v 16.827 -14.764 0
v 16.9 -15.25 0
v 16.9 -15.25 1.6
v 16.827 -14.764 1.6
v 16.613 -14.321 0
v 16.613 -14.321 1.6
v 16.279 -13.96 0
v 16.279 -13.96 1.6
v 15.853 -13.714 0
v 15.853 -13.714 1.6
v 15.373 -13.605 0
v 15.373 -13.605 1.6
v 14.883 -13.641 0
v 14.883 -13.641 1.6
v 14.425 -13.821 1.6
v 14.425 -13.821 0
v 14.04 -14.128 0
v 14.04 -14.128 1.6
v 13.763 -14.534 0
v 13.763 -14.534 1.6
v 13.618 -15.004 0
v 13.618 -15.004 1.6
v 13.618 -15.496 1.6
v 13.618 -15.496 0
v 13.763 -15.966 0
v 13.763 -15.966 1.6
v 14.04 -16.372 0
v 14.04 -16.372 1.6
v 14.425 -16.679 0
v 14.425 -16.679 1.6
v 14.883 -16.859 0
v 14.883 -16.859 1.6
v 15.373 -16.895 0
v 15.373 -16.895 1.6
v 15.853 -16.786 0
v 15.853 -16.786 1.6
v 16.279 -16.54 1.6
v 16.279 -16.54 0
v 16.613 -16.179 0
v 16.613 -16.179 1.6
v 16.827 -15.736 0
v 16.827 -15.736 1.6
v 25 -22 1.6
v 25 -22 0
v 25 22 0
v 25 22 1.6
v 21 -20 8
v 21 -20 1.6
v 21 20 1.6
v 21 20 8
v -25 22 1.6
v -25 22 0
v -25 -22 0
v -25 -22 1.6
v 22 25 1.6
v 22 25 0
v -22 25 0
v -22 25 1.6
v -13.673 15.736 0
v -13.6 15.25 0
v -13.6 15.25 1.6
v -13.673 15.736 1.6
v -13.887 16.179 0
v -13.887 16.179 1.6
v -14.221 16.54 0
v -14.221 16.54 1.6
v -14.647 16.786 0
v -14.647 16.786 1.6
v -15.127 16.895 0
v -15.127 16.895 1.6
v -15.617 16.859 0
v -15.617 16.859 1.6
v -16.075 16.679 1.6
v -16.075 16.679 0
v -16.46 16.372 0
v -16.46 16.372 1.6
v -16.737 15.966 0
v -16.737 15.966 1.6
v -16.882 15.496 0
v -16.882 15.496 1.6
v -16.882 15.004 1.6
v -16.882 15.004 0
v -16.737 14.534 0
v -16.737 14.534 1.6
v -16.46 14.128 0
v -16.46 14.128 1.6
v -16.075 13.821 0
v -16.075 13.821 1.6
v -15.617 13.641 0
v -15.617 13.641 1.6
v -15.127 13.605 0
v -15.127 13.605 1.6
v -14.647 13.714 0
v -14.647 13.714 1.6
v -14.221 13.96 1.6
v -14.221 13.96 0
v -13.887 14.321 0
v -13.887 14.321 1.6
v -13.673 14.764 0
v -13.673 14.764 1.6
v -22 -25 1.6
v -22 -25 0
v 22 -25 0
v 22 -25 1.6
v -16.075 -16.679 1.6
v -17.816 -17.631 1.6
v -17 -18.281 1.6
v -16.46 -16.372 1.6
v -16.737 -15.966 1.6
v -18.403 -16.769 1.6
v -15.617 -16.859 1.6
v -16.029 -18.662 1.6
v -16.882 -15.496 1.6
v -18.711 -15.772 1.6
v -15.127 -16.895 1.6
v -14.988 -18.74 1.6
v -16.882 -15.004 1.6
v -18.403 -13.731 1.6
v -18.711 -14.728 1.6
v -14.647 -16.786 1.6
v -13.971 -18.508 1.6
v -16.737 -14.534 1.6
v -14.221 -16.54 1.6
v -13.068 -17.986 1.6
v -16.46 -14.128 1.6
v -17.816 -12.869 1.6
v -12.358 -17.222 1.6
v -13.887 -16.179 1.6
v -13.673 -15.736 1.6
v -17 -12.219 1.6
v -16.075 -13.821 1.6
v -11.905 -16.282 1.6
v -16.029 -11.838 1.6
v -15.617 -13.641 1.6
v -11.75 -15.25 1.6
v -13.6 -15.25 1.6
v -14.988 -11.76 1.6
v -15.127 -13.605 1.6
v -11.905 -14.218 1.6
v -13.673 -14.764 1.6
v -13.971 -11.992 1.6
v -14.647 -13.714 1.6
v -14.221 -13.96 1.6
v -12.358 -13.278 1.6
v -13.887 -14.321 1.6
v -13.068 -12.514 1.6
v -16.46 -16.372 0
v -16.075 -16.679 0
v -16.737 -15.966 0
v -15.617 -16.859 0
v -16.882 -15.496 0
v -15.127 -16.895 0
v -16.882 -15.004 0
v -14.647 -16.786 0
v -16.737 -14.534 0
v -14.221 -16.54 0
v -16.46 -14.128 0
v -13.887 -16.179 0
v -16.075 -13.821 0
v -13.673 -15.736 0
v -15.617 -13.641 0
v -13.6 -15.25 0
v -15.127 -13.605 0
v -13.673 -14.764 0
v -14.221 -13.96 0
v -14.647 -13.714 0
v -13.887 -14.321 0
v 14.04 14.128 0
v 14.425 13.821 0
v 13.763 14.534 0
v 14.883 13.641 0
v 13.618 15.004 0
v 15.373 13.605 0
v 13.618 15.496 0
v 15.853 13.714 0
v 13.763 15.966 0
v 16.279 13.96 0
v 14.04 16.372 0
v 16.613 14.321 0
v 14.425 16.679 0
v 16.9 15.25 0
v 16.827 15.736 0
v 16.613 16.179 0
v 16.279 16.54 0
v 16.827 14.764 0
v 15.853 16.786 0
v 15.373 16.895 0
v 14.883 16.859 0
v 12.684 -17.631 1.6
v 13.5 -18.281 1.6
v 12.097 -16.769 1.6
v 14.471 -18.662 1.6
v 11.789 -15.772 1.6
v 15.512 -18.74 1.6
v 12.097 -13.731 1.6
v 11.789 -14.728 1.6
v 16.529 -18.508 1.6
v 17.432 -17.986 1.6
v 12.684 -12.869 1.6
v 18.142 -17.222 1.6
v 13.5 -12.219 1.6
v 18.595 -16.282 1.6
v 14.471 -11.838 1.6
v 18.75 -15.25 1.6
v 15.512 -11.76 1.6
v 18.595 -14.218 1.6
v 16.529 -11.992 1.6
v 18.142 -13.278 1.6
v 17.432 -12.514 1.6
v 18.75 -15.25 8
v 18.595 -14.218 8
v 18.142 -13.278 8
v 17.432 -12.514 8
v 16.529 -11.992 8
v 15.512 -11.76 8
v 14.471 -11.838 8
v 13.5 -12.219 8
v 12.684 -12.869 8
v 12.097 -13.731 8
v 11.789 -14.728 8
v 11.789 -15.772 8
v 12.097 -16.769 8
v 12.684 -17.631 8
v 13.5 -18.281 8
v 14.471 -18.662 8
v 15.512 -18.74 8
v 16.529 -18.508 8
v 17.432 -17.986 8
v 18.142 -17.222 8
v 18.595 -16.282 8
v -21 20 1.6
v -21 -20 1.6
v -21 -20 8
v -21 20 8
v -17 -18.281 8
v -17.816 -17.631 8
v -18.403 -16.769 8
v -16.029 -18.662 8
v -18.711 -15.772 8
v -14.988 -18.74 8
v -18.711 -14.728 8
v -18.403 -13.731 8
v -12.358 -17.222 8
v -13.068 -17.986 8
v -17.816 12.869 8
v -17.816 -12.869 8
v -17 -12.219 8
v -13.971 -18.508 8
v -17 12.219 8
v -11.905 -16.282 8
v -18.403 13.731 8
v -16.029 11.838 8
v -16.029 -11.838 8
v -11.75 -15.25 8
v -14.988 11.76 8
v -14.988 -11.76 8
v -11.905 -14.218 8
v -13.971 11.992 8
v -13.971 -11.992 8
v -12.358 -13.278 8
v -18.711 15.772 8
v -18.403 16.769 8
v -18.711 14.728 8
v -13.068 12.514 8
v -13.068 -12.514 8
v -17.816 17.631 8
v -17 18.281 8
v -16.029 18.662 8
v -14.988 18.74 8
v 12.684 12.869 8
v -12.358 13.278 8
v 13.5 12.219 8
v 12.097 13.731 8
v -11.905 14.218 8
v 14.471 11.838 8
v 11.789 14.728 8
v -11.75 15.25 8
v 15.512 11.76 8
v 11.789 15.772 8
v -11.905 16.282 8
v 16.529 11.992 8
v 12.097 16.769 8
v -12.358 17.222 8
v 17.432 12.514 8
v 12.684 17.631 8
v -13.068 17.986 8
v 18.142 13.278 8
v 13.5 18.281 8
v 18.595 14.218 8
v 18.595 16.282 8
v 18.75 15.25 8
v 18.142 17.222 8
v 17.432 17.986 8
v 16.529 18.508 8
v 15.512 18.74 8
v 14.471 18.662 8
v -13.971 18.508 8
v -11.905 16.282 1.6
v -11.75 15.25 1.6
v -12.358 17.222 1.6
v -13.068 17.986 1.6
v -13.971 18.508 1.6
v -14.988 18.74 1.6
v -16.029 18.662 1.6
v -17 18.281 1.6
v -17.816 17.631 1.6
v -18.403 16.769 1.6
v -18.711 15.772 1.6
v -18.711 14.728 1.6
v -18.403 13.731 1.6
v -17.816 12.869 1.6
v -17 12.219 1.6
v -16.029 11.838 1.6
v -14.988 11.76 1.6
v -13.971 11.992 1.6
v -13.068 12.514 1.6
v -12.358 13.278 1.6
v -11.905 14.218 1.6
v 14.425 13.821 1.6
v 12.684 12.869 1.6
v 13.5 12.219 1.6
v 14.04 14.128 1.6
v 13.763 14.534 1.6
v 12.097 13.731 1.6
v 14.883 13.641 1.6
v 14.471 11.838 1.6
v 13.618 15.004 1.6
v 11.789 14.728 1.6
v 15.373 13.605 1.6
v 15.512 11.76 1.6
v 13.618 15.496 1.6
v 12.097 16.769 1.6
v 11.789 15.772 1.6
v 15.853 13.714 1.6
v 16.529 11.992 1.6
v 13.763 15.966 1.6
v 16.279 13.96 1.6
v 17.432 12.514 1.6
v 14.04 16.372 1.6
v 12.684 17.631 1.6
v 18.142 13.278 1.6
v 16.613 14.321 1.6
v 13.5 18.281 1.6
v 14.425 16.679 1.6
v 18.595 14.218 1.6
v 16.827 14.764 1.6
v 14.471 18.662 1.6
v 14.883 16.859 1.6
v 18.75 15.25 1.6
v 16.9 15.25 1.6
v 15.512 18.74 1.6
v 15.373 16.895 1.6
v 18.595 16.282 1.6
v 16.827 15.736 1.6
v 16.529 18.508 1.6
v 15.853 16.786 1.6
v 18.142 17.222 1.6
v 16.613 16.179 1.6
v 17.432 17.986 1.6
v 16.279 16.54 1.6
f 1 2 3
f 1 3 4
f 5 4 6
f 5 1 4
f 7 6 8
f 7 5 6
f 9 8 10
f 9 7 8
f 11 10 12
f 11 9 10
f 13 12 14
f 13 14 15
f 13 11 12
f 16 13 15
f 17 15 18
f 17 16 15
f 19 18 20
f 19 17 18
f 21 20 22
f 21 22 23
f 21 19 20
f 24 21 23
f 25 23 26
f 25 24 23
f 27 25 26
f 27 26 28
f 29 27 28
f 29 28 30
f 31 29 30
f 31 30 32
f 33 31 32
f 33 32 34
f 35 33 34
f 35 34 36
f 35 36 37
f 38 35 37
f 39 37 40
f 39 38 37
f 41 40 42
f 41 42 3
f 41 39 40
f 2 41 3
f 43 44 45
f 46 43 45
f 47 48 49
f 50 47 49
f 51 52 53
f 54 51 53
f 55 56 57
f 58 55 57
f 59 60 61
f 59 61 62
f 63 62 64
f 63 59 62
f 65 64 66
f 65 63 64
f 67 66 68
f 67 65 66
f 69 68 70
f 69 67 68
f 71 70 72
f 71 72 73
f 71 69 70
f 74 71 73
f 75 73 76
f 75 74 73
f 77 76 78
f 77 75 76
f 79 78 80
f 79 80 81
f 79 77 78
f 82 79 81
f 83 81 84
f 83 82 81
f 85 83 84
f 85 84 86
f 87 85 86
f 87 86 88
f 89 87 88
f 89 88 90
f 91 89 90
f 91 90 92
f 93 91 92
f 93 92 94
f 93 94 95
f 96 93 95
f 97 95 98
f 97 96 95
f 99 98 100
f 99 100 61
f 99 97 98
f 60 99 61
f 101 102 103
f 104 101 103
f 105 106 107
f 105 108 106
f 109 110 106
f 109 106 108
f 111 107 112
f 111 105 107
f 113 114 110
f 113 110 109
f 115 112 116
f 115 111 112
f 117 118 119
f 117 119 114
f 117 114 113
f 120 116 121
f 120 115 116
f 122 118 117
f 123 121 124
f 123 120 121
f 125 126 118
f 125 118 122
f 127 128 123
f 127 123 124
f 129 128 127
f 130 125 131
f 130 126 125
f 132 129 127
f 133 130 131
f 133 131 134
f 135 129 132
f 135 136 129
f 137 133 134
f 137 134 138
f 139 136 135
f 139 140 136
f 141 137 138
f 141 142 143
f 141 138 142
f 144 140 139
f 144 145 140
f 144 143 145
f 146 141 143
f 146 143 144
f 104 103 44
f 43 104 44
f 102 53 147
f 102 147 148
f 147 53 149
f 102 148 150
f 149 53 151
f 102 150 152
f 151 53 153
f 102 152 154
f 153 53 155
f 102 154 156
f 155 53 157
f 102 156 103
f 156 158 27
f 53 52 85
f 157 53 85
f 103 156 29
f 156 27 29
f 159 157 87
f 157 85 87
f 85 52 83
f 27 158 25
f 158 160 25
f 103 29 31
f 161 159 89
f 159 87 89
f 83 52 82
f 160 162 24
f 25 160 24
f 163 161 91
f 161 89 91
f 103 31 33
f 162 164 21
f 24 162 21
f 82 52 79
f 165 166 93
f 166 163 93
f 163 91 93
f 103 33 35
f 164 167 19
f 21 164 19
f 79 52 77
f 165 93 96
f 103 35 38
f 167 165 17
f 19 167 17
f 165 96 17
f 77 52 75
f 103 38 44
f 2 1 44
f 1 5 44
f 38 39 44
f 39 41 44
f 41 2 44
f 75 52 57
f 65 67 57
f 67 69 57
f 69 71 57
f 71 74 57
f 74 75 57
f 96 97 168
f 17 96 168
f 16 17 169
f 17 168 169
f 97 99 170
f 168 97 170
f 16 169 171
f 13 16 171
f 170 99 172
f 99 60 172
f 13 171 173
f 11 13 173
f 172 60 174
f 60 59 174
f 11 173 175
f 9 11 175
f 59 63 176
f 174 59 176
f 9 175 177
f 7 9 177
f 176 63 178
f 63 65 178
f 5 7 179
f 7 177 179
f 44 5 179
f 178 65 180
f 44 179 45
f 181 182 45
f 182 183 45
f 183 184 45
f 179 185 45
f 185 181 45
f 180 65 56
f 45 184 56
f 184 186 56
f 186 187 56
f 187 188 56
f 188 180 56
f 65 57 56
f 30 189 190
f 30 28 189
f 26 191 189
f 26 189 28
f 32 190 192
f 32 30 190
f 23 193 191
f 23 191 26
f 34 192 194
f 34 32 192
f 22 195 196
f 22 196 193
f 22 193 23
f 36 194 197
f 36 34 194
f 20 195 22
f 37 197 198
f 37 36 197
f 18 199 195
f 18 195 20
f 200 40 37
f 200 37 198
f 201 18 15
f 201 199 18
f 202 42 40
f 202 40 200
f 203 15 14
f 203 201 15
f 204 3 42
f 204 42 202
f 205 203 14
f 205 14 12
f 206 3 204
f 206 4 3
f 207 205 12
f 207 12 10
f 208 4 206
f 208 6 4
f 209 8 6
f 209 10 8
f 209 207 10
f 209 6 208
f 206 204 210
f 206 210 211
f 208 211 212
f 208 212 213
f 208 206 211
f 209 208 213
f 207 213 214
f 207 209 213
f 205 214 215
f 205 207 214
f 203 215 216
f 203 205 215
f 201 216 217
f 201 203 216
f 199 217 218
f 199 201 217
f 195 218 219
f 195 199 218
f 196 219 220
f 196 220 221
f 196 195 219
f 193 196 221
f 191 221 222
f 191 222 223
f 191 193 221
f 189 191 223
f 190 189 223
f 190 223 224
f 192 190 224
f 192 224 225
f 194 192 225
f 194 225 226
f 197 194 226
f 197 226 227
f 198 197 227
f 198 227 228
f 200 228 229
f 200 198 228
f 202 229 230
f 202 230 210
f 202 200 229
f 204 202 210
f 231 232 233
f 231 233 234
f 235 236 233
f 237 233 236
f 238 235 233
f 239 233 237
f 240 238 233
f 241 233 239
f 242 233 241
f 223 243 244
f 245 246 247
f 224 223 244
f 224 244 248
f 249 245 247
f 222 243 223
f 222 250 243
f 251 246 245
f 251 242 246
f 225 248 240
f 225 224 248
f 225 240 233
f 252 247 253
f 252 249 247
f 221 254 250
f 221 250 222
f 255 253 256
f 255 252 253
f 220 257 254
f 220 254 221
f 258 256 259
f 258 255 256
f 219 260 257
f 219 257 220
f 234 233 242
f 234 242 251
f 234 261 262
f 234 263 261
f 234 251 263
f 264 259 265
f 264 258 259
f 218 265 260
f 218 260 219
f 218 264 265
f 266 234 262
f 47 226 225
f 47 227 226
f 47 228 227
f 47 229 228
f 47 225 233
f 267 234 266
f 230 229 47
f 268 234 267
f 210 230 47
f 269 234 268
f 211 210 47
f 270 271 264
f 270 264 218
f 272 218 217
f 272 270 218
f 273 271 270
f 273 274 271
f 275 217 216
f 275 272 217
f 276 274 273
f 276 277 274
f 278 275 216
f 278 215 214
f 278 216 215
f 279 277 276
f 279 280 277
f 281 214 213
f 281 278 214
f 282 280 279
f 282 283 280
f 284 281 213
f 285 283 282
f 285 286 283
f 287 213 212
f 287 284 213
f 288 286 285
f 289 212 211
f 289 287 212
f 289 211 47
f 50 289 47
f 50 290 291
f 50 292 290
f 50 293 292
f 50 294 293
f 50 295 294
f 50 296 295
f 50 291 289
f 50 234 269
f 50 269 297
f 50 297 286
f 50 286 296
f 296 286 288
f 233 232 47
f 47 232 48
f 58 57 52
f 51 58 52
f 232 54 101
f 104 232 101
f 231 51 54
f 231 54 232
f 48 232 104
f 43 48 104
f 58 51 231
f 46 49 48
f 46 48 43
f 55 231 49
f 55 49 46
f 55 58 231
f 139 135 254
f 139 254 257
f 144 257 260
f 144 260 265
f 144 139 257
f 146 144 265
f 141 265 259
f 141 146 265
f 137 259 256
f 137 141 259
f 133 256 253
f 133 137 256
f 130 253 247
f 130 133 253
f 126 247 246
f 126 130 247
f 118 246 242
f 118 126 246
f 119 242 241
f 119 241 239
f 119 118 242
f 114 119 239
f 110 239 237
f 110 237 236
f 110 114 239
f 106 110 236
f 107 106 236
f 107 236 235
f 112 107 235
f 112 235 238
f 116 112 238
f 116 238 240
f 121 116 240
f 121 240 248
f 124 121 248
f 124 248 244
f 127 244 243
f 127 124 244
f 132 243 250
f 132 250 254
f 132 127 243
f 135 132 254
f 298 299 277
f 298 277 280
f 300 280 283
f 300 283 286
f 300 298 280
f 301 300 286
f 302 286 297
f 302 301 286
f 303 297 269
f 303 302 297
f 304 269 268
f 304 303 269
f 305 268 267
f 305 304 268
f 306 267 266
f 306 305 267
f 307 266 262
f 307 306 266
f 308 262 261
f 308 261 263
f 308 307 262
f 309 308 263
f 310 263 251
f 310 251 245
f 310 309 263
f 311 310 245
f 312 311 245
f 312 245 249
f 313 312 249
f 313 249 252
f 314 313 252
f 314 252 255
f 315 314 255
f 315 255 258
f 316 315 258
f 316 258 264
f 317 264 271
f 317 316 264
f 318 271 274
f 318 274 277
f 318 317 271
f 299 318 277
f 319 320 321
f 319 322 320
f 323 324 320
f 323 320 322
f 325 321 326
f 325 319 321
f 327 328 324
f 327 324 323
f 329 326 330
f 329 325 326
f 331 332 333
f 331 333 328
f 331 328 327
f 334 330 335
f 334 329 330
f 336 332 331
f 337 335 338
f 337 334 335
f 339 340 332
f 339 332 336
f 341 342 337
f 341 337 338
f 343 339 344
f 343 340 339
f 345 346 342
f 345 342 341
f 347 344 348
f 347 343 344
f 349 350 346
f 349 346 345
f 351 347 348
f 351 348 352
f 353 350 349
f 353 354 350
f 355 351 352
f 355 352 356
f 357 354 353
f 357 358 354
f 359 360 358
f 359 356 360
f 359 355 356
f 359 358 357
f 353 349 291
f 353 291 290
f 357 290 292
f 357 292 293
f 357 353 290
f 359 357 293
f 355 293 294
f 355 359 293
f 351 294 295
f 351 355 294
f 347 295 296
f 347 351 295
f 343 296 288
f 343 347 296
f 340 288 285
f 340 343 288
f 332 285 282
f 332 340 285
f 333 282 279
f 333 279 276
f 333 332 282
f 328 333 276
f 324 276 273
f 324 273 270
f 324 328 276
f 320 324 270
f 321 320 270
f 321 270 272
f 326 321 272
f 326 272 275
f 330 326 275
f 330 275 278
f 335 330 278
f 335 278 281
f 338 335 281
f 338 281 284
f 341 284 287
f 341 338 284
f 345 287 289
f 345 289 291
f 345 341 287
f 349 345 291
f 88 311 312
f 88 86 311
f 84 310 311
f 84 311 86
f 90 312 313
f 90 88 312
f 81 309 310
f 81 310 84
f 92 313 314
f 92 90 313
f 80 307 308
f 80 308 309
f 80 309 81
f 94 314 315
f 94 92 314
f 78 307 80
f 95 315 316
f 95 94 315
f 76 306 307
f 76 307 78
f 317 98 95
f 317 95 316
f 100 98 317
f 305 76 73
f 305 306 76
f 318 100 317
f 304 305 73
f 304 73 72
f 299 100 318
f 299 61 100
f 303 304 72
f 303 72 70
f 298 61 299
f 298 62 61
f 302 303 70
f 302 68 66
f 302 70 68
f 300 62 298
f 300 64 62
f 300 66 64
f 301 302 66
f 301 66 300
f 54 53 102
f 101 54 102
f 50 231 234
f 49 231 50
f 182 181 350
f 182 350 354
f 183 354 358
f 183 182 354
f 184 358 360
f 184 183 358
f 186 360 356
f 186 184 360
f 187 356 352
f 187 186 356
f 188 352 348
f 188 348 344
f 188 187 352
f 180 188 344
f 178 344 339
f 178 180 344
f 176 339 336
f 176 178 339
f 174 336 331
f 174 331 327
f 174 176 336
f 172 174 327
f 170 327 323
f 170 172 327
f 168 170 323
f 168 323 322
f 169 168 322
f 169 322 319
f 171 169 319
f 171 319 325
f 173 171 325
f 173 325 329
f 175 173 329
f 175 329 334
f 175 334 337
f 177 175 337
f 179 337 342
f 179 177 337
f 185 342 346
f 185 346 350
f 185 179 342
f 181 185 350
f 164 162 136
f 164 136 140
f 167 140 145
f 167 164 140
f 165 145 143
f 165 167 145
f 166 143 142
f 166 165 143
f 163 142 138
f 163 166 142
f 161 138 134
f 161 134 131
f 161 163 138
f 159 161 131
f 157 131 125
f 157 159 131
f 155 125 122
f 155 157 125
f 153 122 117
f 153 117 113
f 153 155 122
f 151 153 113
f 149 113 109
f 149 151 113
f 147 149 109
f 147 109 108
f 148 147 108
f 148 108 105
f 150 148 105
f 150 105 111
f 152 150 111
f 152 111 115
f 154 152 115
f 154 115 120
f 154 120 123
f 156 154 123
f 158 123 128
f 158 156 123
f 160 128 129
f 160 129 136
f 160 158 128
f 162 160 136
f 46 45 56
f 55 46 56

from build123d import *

# Parameters (mm, degrees)
SKETCH_1_R            = 1.65
EXTRUDE_241_DEPTH     = 1.6
EXTRUDE_START         = 1.6
SKETCH_2_W            = 42
SKETCH_2_H            = 40
EXTRUDE_307_DEPTH     = 6.4
CUT_EXTRUDE_START     = 1.6
SKETCH_3_R            = 3.5
CUT_EXTRUDE_391_DEPTH = 6.4


with BuildPart() as part:
    # 草图1 → Extrude 241 (new body)
    with BuildSketch(Plane.XY):
        Polygon((-22, -25), (22, -25), (25, -22), (25, 22), (22, 25), (-22, 25), (-25, 22), (-25, -22), align=None)
        with Locations((-15.25, -15.25)):
            Circle(SKETCH_1_R, mode=Mode.SUBTRACT)
        with Locations((-15.25, 15.25)):
            Circle(SKETCH_1_R, mode=Mode.SUBTRACT)
        with Locations((15.25, -15.25)):
            Circle(SKETCH_1_R, mode=Mode.SUBTRACT)
        with Locations((15.25, 15.25)):
            Circle(SKETCH_1_R, mode=Mode.SUBTRACT)
    extrude(amount=EXTRUDE_241_DEPTH)

    # 草图2 → Extrude 307 (add)
    with BuildSketch(Plane.XY.offset(EXTRUDE_START)):
        Rectangle(SKETCH_2_W, SKETCH_2_H)
    extrude(amount=EXTRUDE_307_DEPTH)

    # 草图3 → Cut-Extrude 391 (cut)
    with BuildSketch(Plane.XY.offset(CUT_EXTRUDE_START)):
        with Locations((-15.25, -15.25)):
            Circle(SKETCH_3_R)
        with Locations((-15.25, 15.25)):
            Circle(SKETCH_3_R)
        with Locations((15.25, -15.25)):
            Circle(SKETCH_3_R)
        with Locations((15.25, 15.25)):
            Circle(SKETCH_3_R)
    extrude(amount=CUT_EXTRUDE_391_DEPTH, mode=Mode.SUBTRACT)


solid = part.part
